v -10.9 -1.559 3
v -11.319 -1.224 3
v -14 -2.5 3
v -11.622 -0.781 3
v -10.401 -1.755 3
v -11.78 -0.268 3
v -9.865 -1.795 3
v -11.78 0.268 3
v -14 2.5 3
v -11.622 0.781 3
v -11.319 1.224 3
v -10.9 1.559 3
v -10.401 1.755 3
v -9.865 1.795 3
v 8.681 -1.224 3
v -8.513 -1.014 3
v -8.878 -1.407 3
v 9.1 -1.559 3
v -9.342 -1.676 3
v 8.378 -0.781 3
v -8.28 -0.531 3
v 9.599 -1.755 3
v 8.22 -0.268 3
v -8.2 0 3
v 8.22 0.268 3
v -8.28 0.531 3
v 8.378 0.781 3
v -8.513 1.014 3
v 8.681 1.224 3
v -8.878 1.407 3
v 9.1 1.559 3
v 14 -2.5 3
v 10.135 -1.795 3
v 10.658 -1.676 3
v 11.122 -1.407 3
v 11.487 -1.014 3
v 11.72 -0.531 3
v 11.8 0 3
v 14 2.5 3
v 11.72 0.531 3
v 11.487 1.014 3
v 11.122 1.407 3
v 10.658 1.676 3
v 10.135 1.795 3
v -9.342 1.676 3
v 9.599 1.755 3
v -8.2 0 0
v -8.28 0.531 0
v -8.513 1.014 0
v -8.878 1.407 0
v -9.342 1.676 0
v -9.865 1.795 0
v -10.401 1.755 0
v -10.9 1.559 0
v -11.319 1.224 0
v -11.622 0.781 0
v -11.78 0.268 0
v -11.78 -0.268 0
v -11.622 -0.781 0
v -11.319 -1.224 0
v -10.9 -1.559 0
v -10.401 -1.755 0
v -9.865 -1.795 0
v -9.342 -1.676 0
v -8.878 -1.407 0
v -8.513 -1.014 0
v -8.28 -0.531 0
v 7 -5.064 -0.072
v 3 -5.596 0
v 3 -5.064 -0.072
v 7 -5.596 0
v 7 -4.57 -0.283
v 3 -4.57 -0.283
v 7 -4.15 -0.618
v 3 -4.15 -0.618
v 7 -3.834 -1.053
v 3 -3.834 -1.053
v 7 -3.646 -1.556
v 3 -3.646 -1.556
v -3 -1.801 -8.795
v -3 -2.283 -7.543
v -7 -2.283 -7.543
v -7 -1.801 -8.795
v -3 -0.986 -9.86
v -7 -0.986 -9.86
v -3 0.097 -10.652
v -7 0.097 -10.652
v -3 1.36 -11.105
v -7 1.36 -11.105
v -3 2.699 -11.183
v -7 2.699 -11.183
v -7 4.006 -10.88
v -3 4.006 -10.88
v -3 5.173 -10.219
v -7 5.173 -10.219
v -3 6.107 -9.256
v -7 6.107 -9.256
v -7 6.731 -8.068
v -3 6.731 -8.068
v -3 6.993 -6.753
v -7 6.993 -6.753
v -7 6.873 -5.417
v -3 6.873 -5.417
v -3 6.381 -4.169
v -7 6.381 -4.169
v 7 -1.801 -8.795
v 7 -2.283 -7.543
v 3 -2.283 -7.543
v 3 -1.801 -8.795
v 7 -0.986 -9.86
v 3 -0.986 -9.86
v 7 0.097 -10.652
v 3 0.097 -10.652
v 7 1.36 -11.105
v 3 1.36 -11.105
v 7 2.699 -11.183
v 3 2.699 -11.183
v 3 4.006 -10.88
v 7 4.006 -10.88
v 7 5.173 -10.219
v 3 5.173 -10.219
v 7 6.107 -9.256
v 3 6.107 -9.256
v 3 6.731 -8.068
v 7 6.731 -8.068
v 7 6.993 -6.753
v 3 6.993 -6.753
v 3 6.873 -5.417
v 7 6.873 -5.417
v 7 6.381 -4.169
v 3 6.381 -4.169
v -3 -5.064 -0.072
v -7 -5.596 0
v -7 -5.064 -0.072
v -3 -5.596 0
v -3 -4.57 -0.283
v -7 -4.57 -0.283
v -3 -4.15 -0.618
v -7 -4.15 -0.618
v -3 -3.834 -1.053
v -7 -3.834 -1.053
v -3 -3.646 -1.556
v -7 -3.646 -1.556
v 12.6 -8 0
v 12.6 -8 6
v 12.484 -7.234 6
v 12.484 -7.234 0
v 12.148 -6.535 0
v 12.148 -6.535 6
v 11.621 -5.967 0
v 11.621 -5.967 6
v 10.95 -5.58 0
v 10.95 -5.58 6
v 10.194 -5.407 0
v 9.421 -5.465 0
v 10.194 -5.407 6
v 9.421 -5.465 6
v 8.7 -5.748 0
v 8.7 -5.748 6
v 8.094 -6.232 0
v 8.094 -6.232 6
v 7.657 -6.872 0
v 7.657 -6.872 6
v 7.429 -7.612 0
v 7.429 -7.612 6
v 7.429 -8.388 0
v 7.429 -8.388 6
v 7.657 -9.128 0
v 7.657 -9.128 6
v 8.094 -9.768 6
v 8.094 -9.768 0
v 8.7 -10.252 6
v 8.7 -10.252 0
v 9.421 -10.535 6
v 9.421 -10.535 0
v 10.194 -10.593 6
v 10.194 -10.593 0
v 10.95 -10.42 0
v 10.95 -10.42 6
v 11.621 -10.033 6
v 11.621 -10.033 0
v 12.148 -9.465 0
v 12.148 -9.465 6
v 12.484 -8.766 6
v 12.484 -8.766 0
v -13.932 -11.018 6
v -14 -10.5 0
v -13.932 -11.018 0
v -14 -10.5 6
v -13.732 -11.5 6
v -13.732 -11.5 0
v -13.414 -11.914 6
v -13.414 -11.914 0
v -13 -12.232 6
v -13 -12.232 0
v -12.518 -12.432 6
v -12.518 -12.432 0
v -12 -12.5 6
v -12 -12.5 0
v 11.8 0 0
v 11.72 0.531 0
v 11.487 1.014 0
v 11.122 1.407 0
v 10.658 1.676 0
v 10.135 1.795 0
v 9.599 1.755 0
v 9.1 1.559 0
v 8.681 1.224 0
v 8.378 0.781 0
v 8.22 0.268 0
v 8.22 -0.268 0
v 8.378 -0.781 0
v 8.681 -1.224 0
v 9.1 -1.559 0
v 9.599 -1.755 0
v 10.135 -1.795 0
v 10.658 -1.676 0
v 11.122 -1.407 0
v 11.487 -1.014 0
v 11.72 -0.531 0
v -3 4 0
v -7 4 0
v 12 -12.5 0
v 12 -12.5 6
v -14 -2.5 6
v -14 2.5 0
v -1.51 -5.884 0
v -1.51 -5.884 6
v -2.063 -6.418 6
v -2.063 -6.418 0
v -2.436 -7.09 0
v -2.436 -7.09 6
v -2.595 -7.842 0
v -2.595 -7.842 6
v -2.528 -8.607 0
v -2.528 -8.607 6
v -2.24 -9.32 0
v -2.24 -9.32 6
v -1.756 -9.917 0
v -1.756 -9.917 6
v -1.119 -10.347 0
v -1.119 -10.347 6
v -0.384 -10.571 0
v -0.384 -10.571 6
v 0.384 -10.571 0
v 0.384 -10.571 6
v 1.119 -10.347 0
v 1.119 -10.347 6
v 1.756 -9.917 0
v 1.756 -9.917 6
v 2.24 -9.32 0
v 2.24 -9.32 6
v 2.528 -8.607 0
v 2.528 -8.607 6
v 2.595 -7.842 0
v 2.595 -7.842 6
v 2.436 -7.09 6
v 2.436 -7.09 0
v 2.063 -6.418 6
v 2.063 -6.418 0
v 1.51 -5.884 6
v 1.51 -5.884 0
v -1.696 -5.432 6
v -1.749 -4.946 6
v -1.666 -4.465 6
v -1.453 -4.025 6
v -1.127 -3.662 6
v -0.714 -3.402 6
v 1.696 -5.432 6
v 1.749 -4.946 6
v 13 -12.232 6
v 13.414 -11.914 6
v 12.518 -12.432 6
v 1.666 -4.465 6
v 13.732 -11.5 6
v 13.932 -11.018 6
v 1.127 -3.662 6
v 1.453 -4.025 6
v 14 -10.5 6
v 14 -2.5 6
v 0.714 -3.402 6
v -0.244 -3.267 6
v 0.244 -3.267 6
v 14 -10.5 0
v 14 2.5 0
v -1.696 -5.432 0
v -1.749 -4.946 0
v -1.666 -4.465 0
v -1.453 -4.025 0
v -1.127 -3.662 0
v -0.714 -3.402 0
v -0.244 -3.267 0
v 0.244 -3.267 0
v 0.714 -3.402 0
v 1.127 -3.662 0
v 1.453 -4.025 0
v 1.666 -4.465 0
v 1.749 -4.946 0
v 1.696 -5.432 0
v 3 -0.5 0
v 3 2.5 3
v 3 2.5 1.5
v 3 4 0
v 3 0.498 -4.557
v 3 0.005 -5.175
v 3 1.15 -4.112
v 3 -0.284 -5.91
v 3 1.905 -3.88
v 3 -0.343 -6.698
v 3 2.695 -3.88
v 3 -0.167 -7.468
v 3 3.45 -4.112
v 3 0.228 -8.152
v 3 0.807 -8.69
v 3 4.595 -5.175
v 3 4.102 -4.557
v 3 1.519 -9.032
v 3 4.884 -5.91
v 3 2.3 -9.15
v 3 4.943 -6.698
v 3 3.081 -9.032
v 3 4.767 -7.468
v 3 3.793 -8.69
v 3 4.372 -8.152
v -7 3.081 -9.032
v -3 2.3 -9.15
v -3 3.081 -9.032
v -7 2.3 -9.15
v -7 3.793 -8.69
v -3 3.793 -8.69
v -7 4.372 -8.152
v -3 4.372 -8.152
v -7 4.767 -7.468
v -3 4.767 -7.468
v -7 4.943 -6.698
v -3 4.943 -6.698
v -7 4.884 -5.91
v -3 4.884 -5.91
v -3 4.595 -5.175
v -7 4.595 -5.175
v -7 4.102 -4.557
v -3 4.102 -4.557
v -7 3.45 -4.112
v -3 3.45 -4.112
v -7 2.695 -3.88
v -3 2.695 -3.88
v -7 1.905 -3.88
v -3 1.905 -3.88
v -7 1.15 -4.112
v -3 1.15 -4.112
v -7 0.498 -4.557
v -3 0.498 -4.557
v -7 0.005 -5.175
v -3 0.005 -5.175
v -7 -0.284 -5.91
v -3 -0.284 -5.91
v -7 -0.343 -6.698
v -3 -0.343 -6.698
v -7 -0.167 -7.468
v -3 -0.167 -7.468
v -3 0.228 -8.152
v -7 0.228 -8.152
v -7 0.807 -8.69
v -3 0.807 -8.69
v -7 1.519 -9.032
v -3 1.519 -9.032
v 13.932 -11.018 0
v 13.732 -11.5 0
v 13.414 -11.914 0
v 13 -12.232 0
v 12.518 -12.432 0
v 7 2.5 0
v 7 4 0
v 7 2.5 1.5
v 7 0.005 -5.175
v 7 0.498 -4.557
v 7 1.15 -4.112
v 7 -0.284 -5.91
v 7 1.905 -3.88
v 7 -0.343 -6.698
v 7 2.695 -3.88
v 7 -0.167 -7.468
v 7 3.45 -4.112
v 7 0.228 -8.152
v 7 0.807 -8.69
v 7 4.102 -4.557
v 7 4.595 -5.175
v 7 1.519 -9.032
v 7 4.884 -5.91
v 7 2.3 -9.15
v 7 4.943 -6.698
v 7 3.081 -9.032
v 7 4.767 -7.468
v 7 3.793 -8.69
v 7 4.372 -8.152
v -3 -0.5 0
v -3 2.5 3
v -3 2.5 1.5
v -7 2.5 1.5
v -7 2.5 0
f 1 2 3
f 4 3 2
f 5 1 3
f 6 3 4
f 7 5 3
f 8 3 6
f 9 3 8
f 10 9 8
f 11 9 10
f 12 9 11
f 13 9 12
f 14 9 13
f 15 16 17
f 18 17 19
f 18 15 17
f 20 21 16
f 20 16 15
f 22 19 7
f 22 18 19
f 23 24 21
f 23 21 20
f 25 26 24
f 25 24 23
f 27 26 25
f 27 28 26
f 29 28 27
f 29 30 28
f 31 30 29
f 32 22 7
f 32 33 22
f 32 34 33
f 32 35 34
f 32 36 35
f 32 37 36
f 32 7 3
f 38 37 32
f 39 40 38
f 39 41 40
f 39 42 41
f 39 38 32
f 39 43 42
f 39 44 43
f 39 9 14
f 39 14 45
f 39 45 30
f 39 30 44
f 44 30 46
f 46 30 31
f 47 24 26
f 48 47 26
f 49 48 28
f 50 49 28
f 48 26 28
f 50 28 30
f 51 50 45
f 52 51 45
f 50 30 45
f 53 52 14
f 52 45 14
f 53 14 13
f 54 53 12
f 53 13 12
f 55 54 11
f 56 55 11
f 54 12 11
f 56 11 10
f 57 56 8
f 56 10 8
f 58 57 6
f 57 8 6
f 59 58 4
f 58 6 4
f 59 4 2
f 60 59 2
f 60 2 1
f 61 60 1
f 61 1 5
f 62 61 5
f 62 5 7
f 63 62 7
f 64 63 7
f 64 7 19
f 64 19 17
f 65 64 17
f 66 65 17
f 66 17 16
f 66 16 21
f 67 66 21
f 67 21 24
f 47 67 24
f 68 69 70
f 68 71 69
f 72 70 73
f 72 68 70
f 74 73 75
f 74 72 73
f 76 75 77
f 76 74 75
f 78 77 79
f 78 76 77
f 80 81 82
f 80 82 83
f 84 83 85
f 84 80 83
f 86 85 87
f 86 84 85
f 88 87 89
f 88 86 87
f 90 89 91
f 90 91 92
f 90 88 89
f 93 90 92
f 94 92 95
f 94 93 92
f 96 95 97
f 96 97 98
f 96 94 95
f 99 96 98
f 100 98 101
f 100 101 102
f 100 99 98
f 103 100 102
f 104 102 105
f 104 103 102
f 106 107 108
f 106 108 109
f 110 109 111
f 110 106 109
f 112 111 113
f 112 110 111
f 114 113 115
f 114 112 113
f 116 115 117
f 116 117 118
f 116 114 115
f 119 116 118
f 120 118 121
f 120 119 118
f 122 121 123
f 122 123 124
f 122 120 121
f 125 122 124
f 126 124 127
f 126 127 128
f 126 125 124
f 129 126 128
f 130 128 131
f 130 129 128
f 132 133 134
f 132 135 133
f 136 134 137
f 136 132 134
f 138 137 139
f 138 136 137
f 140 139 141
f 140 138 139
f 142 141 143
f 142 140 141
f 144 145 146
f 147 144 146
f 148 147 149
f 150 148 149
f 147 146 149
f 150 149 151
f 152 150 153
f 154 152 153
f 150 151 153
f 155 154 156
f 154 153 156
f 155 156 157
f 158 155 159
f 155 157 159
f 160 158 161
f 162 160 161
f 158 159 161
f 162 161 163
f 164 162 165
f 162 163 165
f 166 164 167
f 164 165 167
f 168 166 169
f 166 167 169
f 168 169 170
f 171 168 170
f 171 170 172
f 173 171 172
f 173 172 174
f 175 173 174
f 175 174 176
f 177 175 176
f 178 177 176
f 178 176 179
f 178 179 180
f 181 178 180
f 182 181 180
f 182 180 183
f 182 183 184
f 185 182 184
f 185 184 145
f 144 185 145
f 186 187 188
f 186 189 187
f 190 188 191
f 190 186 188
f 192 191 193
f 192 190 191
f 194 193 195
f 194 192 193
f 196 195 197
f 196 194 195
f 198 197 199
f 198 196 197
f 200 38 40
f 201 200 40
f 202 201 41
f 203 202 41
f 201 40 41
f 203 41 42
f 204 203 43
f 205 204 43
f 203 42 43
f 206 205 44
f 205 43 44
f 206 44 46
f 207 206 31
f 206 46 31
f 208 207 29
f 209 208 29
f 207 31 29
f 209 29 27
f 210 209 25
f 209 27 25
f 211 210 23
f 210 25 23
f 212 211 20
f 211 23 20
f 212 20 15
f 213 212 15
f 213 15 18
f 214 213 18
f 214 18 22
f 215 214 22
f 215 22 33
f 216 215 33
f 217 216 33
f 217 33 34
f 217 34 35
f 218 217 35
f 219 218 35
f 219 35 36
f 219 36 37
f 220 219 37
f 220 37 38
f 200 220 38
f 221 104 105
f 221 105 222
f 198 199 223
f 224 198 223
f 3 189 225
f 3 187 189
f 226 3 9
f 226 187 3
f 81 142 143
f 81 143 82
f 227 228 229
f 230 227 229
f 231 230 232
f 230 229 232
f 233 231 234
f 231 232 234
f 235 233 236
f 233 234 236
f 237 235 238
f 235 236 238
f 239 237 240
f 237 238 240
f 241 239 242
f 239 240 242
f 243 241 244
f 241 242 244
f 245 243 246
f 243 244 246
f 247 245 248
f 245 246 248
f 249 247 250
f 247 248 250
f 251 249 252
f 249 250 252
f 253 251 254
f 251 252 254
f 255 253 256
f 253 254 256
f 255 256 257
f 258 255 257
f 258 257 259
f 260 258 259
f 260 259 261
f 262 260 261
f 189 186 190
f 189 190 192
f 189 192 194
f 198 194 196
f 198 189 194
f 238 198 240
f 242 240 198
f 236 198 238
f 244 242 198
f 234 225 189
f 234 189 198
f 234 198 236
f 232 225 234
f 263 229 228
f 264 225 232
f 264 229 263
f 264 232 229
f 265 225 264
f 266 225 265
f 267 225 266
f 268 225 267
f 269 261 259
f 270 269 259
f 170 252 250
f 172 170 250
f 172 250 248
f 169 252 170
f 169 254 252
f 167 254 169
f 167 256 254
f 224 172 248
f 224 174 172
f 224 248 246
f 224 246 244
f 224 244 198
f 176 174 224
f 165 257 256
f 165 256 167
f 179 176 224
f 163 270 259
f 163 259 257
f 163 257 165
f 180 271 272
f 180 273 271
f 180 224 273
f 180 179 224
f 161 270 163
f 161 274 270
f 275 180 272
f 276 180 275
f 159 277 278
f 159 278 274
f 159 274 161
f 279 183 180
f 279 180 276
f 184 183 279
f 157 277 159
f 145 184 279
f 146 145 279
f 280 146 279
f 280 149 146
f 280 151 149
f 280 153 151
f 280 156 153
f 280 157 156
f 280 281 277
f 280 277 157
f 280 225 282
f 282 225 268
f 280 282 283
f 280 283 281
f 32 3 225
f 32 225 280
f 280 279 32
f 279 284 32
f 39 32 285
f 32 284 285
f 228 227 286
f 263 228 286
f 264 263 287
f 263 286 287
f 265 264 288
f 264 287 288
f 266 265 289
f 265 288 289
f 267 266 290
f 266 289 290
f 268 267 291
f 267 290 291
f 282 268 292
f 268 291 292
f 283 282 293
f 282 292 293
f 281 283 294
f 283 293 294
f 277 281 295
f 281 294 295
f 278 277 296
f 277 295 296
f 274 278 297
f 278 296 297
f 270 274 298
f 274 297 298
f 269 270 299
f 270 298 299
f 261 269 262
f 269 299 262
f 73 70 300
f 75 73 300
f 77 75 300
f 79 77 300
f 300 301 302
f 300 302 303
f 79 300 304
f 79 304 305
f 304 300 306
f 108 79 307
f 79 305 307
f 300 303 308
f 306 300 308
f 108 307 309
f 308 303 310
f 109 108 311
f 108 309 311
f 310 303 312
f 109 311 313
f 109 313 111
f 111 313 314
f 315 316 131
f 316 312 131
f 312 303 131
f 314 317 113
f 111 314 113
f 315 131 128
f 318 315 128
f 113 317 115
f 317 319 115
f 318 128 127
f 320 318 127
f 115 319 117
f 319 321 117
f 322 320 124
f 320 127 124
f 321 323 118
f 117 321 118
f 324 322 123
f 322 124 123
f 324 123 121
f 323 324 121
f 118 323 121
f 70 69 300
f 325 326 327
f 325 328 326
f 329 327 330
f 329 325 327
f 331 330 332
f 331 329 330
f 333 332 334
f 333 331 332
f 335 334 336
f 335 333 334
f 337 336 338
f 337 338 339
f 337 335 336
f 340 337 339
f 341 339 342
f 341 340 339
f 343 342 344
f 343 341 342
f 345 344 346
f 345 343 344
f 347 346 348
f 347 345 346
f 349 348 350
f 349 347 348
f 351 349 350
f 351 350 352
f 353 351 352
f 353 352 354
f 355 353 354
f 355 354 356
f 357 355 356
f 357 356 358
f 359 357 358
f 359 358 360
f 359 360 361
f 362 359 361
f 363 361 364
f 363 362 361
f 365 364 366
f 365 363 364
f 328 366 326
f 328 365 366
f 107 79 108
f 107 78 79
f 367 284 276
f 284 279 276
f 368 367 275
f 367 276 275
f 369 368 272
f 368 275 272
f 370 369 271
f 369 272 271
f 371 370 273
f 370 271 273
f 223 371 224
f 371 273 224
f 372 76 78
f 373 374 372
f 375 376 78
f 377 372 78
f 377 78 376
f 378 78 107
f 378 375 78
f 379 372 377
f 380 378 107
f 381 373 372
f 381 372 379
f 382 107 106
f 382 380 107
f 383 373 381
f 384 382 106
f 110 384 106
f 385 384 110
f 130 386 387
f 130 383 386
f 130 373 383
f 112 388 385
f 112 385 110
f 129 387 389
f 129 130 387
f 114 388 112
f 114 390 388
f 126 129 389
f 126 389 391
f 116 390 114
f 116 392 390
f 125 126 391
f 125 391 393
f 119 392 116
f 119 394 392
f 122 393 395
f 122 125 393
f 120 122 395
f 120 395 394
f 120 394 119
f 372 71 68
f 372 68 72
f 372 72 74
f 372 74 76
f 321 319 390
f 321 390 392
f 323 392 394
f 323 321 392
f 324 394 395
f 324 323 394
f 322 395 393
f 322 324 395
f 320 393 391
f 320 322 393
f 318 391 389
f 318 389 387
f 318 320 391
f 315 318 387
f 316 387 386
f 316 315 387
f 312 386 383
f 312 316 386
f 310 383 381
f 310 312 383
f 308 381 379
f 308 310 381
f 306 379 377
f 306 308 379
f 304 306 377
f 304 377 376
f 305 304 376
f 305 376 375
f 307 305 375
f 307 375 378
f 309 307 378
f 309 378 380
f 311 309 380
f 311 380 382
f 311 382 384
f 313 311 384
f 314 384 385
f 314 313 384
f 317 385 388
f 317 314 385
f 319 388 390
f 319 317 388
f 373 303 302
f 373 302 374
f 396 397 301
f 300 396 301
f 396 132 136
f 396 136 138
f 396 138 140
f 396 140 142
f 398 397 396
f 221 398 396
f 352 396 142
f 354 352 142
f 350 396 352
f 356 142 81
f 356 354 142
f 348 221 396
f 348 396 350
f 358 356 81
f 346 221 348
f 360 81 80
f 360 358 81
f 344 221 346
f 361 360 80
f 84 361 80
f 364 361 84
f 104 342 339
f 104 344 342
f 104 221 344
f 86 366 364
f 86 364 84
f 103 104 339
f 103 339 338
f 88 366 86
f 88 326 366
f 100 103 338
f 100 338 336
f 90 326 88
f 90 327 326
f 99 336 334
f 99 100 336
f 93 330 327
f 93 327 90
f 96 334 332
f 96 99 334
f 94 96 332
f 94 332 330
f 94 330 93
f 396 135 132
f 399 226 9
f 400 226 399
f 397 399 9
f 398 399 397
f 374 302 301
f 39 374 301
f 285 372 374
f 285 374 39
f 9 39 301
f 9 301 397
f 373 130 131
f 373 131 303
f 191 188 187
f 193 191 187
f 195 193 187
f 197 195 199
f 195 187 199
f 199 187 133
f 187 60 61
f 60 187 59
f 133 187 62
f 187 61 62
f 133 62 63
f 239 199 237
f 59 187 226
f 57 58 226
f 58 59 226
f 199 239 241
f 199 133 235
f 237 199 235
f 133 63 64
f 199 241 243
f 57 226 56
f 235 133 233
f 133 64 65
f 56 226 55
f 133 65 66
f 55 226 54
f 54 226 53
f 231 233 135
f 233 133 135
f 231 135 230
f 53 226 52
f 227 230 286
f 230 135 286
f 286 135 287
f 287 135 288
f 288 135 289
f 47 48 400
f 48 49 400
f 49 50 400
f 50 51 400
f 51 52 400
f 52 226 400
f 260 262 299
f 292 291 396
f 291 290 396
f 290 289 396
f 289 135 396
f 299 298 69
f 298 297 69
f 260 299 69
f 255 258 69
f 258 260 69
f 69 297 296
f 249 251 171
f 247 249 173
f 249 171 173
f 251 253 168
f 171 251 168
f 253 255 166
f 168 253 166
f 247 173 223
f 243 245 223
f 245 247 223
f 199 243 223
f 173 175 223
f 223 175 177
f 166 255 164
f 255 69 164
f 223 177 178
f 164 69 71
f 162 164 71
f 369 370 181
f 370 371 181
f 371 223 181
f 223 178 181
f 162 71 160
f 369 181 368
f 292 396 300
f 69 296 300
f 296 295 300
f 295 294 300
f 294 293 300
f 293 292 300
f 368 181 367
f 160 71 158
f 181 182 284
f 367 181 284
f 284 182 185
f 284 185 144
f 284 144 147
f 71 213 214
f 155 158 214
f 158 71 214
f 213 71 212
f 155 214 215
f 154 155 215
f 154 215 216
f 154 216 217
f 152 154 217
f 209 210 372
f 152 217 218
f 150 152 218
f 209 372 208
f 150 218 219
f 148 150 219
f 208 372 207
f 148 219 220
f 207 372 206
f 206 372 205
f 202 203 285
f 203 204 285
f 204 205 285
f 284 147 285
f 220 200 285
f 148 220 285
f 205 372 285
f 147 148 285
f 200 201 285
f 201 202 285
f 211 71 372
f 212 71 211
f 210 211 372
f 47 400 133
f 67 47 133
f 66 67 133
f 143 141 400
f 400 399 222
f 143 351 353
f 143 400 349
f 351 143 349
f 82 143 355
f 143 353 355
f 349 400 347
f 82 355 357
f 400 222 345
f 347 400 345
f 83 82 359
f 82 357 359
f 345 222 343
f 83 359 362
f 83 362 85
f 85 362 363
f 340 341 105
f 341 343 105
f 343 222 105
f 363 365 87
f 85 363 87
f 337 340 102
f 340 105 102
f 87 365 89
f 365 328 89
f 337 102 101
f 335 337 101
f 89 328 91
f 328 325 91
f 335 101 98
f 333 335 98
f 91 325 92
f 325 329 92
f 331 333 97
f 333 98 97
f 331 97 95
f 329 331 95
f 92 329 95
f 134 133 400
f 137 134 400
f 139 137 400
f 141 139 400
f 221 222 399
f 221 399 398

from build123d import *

# Parameters (mm, degrees)
SKETCH1_W           = 28
SKETCH1_H           = 5
BOSS_EXTRUDE1_DEPTH = 3
SKETCH1_3_W         = 28
SKETCH1_3_H         = 10
BOSS_EXTRUDE2_DEPTH = 6
SKETCH2_R           = 1.8
CUT_EXTRUDE1_DEPTH  = 20.006577809
SKETCH3_R           = 2.6
CUT_EXTRUDE2_DEPTH  = 20.704060495
SKETCH4_R           = 1.75
CUT_EXTRUDE3_DEPTH  = 20.704060495
SKETCH5_R           = 2.65
BOSS_EXTRUDE3_DEPTH = 7
SKETCH5_3_R         = 2.65
CUT_EXTRUDE5_DEPTH  = 3
CHAMFER1_SIZE       = 3
CHAMFER2_SIZE       = 1.5
FILLET1_R           = 2


with BuildPart() as part:
    # Sketch1 → Boss-Extrude1 (new body)
    with BuildSketch(Plane.XY):
        Rectangle(SKETCH1_W, SKETCH1_H)
    extrude(amount=BOSS_EXTRUDE1_DEPTH)

    # Sketch1<3> → Boss-Extrude2 (add)
    with BuildSketch(Plane.XY):
        with Locations((0, -7.5)):
            Rectangle(SKETCH1_3_W, SKETCH1_3_H)
    extrude(amount=BOSS_EXTRUDE2_DEPTH)

    # Sketch2 → Cut-Extrude1 (cut, through all)
    with BuildSketch(Plane.XY.offset(3)):
        with Locations((10, 0)):
            Circle(SKETCH2_R)
        with Locations((-10, 0)):
            Circle(SKETCH2_R)
    extrude(amount=-CUT_EXTRUDE1_DEPTH, mode=Mode.SUBTRACT)

    # Sketch3 → Cut-Extrude2 (cut, through all)
    with BuildSketch(Plane.XY.offset(6)):
        with Locations((10, -8)):
            Circle(SKETCH3_R)
        with Locations((0, -8)):
            Circle(SKETCH3_R)
    extrude(amount=-CUT_EXTRUDE2_DEPTH, mode=Mode.SUBTRACT)

    # Sketch4 → Cut-Extrude3 (cut, through all)
    with BuildSketch(Plane(origin=(0, 0, 0), x_dir=(-1, 0, 0), z_dir=(0, 0, -1))):
        with Locations((0, -5)):
            Circle(SKETCH4_R)
    extrude(amount=-CUT_EXTRUDE3_DEPTH, mode=Mode.SUBTRACT)

    # Sketch5 → Boss-Extrude3 (add, symmetric)
    with BuildSketch(Plane(origin=(0, 0, 0), x_dir=(0, 0, -1), z_dir=(1, 0, 0))):
        with BuildLine():
            Line((0, 4), (0, -4))
            Line((0, -4), (7.543277969, -2.282747111))
            ThreePointArc((7.543277969, -2.282747111), (10.879560122, 4.005711915), (4.168926053, 6.381187848))
            Line((4.168926053, 6.381187848), (0, 4))
        make_face()
        with Locations((6.5, 2.3)):
            Circle(SKETCH5_R, mode=Mode.SUBTRACT)
    extrude(amount=BOSS_EXTRUDE3_DEPTH, both=True)

    # Sketch5<3> → Cut-Extrude5 (cut, symmetric)
    with BuildSketch(Plane(origin=(0, 0, 0), x_dir=(0, 0, -1), z_dir=(1, 0, 0))):
        with BuildLine():
            Line((0, 4), (0, -4))
            Line((0, -4), (7.543277969, -2.282747111))
            ThreePointArc((7.543277969, -2.282747111), (10.879560122, 4.005711915), (4.168926053, 6.381187848))
            Line((4.168926053, 6.381187848), (0, 4))
        make_face()
        with Locations((6.5, 2.3)):
            Circle(SKETCH5_3_R, mode=Mode.SUBTRACT)
    extrude(amount=CUT_EXTRUDE5_DEPTH, both=True, mode=Mode.SUBTRACT)

    # Chamfer1
    chamfer1_edges = [part.edges().sort_by_distance(p)[0] for p in [
        (0, 2.5, 0),
    ]]
    chamfer(chamfer1_edges, length=CHAMFER1_SIZE - 0.0001)  # a hair under: the kernel refuses the full size

    # Chamfer2
    chamfer2_edges = [part.edges().sort_by_distance(p)[0] for p in [
        (-5, 2.5, 0),
        (5, 2.5, 0),
    ]]
    chamfer(chamfer2_edges, length=CHAMFER2_SIZE - 0.0001)  # a hair under: the kernel refuses the full size

    # Fillet1
    fillet1_edges = [part.edges().sort_by_distance(p)[0] for p in [
        (-14, -12.5, 3),
        (14, -12.5, 3),
        (5, -4, 0),
        (-5, -4, 0),
    ]]
    fillet(fillet1_edges, radius=FILLET1_R)


solid = part.part
